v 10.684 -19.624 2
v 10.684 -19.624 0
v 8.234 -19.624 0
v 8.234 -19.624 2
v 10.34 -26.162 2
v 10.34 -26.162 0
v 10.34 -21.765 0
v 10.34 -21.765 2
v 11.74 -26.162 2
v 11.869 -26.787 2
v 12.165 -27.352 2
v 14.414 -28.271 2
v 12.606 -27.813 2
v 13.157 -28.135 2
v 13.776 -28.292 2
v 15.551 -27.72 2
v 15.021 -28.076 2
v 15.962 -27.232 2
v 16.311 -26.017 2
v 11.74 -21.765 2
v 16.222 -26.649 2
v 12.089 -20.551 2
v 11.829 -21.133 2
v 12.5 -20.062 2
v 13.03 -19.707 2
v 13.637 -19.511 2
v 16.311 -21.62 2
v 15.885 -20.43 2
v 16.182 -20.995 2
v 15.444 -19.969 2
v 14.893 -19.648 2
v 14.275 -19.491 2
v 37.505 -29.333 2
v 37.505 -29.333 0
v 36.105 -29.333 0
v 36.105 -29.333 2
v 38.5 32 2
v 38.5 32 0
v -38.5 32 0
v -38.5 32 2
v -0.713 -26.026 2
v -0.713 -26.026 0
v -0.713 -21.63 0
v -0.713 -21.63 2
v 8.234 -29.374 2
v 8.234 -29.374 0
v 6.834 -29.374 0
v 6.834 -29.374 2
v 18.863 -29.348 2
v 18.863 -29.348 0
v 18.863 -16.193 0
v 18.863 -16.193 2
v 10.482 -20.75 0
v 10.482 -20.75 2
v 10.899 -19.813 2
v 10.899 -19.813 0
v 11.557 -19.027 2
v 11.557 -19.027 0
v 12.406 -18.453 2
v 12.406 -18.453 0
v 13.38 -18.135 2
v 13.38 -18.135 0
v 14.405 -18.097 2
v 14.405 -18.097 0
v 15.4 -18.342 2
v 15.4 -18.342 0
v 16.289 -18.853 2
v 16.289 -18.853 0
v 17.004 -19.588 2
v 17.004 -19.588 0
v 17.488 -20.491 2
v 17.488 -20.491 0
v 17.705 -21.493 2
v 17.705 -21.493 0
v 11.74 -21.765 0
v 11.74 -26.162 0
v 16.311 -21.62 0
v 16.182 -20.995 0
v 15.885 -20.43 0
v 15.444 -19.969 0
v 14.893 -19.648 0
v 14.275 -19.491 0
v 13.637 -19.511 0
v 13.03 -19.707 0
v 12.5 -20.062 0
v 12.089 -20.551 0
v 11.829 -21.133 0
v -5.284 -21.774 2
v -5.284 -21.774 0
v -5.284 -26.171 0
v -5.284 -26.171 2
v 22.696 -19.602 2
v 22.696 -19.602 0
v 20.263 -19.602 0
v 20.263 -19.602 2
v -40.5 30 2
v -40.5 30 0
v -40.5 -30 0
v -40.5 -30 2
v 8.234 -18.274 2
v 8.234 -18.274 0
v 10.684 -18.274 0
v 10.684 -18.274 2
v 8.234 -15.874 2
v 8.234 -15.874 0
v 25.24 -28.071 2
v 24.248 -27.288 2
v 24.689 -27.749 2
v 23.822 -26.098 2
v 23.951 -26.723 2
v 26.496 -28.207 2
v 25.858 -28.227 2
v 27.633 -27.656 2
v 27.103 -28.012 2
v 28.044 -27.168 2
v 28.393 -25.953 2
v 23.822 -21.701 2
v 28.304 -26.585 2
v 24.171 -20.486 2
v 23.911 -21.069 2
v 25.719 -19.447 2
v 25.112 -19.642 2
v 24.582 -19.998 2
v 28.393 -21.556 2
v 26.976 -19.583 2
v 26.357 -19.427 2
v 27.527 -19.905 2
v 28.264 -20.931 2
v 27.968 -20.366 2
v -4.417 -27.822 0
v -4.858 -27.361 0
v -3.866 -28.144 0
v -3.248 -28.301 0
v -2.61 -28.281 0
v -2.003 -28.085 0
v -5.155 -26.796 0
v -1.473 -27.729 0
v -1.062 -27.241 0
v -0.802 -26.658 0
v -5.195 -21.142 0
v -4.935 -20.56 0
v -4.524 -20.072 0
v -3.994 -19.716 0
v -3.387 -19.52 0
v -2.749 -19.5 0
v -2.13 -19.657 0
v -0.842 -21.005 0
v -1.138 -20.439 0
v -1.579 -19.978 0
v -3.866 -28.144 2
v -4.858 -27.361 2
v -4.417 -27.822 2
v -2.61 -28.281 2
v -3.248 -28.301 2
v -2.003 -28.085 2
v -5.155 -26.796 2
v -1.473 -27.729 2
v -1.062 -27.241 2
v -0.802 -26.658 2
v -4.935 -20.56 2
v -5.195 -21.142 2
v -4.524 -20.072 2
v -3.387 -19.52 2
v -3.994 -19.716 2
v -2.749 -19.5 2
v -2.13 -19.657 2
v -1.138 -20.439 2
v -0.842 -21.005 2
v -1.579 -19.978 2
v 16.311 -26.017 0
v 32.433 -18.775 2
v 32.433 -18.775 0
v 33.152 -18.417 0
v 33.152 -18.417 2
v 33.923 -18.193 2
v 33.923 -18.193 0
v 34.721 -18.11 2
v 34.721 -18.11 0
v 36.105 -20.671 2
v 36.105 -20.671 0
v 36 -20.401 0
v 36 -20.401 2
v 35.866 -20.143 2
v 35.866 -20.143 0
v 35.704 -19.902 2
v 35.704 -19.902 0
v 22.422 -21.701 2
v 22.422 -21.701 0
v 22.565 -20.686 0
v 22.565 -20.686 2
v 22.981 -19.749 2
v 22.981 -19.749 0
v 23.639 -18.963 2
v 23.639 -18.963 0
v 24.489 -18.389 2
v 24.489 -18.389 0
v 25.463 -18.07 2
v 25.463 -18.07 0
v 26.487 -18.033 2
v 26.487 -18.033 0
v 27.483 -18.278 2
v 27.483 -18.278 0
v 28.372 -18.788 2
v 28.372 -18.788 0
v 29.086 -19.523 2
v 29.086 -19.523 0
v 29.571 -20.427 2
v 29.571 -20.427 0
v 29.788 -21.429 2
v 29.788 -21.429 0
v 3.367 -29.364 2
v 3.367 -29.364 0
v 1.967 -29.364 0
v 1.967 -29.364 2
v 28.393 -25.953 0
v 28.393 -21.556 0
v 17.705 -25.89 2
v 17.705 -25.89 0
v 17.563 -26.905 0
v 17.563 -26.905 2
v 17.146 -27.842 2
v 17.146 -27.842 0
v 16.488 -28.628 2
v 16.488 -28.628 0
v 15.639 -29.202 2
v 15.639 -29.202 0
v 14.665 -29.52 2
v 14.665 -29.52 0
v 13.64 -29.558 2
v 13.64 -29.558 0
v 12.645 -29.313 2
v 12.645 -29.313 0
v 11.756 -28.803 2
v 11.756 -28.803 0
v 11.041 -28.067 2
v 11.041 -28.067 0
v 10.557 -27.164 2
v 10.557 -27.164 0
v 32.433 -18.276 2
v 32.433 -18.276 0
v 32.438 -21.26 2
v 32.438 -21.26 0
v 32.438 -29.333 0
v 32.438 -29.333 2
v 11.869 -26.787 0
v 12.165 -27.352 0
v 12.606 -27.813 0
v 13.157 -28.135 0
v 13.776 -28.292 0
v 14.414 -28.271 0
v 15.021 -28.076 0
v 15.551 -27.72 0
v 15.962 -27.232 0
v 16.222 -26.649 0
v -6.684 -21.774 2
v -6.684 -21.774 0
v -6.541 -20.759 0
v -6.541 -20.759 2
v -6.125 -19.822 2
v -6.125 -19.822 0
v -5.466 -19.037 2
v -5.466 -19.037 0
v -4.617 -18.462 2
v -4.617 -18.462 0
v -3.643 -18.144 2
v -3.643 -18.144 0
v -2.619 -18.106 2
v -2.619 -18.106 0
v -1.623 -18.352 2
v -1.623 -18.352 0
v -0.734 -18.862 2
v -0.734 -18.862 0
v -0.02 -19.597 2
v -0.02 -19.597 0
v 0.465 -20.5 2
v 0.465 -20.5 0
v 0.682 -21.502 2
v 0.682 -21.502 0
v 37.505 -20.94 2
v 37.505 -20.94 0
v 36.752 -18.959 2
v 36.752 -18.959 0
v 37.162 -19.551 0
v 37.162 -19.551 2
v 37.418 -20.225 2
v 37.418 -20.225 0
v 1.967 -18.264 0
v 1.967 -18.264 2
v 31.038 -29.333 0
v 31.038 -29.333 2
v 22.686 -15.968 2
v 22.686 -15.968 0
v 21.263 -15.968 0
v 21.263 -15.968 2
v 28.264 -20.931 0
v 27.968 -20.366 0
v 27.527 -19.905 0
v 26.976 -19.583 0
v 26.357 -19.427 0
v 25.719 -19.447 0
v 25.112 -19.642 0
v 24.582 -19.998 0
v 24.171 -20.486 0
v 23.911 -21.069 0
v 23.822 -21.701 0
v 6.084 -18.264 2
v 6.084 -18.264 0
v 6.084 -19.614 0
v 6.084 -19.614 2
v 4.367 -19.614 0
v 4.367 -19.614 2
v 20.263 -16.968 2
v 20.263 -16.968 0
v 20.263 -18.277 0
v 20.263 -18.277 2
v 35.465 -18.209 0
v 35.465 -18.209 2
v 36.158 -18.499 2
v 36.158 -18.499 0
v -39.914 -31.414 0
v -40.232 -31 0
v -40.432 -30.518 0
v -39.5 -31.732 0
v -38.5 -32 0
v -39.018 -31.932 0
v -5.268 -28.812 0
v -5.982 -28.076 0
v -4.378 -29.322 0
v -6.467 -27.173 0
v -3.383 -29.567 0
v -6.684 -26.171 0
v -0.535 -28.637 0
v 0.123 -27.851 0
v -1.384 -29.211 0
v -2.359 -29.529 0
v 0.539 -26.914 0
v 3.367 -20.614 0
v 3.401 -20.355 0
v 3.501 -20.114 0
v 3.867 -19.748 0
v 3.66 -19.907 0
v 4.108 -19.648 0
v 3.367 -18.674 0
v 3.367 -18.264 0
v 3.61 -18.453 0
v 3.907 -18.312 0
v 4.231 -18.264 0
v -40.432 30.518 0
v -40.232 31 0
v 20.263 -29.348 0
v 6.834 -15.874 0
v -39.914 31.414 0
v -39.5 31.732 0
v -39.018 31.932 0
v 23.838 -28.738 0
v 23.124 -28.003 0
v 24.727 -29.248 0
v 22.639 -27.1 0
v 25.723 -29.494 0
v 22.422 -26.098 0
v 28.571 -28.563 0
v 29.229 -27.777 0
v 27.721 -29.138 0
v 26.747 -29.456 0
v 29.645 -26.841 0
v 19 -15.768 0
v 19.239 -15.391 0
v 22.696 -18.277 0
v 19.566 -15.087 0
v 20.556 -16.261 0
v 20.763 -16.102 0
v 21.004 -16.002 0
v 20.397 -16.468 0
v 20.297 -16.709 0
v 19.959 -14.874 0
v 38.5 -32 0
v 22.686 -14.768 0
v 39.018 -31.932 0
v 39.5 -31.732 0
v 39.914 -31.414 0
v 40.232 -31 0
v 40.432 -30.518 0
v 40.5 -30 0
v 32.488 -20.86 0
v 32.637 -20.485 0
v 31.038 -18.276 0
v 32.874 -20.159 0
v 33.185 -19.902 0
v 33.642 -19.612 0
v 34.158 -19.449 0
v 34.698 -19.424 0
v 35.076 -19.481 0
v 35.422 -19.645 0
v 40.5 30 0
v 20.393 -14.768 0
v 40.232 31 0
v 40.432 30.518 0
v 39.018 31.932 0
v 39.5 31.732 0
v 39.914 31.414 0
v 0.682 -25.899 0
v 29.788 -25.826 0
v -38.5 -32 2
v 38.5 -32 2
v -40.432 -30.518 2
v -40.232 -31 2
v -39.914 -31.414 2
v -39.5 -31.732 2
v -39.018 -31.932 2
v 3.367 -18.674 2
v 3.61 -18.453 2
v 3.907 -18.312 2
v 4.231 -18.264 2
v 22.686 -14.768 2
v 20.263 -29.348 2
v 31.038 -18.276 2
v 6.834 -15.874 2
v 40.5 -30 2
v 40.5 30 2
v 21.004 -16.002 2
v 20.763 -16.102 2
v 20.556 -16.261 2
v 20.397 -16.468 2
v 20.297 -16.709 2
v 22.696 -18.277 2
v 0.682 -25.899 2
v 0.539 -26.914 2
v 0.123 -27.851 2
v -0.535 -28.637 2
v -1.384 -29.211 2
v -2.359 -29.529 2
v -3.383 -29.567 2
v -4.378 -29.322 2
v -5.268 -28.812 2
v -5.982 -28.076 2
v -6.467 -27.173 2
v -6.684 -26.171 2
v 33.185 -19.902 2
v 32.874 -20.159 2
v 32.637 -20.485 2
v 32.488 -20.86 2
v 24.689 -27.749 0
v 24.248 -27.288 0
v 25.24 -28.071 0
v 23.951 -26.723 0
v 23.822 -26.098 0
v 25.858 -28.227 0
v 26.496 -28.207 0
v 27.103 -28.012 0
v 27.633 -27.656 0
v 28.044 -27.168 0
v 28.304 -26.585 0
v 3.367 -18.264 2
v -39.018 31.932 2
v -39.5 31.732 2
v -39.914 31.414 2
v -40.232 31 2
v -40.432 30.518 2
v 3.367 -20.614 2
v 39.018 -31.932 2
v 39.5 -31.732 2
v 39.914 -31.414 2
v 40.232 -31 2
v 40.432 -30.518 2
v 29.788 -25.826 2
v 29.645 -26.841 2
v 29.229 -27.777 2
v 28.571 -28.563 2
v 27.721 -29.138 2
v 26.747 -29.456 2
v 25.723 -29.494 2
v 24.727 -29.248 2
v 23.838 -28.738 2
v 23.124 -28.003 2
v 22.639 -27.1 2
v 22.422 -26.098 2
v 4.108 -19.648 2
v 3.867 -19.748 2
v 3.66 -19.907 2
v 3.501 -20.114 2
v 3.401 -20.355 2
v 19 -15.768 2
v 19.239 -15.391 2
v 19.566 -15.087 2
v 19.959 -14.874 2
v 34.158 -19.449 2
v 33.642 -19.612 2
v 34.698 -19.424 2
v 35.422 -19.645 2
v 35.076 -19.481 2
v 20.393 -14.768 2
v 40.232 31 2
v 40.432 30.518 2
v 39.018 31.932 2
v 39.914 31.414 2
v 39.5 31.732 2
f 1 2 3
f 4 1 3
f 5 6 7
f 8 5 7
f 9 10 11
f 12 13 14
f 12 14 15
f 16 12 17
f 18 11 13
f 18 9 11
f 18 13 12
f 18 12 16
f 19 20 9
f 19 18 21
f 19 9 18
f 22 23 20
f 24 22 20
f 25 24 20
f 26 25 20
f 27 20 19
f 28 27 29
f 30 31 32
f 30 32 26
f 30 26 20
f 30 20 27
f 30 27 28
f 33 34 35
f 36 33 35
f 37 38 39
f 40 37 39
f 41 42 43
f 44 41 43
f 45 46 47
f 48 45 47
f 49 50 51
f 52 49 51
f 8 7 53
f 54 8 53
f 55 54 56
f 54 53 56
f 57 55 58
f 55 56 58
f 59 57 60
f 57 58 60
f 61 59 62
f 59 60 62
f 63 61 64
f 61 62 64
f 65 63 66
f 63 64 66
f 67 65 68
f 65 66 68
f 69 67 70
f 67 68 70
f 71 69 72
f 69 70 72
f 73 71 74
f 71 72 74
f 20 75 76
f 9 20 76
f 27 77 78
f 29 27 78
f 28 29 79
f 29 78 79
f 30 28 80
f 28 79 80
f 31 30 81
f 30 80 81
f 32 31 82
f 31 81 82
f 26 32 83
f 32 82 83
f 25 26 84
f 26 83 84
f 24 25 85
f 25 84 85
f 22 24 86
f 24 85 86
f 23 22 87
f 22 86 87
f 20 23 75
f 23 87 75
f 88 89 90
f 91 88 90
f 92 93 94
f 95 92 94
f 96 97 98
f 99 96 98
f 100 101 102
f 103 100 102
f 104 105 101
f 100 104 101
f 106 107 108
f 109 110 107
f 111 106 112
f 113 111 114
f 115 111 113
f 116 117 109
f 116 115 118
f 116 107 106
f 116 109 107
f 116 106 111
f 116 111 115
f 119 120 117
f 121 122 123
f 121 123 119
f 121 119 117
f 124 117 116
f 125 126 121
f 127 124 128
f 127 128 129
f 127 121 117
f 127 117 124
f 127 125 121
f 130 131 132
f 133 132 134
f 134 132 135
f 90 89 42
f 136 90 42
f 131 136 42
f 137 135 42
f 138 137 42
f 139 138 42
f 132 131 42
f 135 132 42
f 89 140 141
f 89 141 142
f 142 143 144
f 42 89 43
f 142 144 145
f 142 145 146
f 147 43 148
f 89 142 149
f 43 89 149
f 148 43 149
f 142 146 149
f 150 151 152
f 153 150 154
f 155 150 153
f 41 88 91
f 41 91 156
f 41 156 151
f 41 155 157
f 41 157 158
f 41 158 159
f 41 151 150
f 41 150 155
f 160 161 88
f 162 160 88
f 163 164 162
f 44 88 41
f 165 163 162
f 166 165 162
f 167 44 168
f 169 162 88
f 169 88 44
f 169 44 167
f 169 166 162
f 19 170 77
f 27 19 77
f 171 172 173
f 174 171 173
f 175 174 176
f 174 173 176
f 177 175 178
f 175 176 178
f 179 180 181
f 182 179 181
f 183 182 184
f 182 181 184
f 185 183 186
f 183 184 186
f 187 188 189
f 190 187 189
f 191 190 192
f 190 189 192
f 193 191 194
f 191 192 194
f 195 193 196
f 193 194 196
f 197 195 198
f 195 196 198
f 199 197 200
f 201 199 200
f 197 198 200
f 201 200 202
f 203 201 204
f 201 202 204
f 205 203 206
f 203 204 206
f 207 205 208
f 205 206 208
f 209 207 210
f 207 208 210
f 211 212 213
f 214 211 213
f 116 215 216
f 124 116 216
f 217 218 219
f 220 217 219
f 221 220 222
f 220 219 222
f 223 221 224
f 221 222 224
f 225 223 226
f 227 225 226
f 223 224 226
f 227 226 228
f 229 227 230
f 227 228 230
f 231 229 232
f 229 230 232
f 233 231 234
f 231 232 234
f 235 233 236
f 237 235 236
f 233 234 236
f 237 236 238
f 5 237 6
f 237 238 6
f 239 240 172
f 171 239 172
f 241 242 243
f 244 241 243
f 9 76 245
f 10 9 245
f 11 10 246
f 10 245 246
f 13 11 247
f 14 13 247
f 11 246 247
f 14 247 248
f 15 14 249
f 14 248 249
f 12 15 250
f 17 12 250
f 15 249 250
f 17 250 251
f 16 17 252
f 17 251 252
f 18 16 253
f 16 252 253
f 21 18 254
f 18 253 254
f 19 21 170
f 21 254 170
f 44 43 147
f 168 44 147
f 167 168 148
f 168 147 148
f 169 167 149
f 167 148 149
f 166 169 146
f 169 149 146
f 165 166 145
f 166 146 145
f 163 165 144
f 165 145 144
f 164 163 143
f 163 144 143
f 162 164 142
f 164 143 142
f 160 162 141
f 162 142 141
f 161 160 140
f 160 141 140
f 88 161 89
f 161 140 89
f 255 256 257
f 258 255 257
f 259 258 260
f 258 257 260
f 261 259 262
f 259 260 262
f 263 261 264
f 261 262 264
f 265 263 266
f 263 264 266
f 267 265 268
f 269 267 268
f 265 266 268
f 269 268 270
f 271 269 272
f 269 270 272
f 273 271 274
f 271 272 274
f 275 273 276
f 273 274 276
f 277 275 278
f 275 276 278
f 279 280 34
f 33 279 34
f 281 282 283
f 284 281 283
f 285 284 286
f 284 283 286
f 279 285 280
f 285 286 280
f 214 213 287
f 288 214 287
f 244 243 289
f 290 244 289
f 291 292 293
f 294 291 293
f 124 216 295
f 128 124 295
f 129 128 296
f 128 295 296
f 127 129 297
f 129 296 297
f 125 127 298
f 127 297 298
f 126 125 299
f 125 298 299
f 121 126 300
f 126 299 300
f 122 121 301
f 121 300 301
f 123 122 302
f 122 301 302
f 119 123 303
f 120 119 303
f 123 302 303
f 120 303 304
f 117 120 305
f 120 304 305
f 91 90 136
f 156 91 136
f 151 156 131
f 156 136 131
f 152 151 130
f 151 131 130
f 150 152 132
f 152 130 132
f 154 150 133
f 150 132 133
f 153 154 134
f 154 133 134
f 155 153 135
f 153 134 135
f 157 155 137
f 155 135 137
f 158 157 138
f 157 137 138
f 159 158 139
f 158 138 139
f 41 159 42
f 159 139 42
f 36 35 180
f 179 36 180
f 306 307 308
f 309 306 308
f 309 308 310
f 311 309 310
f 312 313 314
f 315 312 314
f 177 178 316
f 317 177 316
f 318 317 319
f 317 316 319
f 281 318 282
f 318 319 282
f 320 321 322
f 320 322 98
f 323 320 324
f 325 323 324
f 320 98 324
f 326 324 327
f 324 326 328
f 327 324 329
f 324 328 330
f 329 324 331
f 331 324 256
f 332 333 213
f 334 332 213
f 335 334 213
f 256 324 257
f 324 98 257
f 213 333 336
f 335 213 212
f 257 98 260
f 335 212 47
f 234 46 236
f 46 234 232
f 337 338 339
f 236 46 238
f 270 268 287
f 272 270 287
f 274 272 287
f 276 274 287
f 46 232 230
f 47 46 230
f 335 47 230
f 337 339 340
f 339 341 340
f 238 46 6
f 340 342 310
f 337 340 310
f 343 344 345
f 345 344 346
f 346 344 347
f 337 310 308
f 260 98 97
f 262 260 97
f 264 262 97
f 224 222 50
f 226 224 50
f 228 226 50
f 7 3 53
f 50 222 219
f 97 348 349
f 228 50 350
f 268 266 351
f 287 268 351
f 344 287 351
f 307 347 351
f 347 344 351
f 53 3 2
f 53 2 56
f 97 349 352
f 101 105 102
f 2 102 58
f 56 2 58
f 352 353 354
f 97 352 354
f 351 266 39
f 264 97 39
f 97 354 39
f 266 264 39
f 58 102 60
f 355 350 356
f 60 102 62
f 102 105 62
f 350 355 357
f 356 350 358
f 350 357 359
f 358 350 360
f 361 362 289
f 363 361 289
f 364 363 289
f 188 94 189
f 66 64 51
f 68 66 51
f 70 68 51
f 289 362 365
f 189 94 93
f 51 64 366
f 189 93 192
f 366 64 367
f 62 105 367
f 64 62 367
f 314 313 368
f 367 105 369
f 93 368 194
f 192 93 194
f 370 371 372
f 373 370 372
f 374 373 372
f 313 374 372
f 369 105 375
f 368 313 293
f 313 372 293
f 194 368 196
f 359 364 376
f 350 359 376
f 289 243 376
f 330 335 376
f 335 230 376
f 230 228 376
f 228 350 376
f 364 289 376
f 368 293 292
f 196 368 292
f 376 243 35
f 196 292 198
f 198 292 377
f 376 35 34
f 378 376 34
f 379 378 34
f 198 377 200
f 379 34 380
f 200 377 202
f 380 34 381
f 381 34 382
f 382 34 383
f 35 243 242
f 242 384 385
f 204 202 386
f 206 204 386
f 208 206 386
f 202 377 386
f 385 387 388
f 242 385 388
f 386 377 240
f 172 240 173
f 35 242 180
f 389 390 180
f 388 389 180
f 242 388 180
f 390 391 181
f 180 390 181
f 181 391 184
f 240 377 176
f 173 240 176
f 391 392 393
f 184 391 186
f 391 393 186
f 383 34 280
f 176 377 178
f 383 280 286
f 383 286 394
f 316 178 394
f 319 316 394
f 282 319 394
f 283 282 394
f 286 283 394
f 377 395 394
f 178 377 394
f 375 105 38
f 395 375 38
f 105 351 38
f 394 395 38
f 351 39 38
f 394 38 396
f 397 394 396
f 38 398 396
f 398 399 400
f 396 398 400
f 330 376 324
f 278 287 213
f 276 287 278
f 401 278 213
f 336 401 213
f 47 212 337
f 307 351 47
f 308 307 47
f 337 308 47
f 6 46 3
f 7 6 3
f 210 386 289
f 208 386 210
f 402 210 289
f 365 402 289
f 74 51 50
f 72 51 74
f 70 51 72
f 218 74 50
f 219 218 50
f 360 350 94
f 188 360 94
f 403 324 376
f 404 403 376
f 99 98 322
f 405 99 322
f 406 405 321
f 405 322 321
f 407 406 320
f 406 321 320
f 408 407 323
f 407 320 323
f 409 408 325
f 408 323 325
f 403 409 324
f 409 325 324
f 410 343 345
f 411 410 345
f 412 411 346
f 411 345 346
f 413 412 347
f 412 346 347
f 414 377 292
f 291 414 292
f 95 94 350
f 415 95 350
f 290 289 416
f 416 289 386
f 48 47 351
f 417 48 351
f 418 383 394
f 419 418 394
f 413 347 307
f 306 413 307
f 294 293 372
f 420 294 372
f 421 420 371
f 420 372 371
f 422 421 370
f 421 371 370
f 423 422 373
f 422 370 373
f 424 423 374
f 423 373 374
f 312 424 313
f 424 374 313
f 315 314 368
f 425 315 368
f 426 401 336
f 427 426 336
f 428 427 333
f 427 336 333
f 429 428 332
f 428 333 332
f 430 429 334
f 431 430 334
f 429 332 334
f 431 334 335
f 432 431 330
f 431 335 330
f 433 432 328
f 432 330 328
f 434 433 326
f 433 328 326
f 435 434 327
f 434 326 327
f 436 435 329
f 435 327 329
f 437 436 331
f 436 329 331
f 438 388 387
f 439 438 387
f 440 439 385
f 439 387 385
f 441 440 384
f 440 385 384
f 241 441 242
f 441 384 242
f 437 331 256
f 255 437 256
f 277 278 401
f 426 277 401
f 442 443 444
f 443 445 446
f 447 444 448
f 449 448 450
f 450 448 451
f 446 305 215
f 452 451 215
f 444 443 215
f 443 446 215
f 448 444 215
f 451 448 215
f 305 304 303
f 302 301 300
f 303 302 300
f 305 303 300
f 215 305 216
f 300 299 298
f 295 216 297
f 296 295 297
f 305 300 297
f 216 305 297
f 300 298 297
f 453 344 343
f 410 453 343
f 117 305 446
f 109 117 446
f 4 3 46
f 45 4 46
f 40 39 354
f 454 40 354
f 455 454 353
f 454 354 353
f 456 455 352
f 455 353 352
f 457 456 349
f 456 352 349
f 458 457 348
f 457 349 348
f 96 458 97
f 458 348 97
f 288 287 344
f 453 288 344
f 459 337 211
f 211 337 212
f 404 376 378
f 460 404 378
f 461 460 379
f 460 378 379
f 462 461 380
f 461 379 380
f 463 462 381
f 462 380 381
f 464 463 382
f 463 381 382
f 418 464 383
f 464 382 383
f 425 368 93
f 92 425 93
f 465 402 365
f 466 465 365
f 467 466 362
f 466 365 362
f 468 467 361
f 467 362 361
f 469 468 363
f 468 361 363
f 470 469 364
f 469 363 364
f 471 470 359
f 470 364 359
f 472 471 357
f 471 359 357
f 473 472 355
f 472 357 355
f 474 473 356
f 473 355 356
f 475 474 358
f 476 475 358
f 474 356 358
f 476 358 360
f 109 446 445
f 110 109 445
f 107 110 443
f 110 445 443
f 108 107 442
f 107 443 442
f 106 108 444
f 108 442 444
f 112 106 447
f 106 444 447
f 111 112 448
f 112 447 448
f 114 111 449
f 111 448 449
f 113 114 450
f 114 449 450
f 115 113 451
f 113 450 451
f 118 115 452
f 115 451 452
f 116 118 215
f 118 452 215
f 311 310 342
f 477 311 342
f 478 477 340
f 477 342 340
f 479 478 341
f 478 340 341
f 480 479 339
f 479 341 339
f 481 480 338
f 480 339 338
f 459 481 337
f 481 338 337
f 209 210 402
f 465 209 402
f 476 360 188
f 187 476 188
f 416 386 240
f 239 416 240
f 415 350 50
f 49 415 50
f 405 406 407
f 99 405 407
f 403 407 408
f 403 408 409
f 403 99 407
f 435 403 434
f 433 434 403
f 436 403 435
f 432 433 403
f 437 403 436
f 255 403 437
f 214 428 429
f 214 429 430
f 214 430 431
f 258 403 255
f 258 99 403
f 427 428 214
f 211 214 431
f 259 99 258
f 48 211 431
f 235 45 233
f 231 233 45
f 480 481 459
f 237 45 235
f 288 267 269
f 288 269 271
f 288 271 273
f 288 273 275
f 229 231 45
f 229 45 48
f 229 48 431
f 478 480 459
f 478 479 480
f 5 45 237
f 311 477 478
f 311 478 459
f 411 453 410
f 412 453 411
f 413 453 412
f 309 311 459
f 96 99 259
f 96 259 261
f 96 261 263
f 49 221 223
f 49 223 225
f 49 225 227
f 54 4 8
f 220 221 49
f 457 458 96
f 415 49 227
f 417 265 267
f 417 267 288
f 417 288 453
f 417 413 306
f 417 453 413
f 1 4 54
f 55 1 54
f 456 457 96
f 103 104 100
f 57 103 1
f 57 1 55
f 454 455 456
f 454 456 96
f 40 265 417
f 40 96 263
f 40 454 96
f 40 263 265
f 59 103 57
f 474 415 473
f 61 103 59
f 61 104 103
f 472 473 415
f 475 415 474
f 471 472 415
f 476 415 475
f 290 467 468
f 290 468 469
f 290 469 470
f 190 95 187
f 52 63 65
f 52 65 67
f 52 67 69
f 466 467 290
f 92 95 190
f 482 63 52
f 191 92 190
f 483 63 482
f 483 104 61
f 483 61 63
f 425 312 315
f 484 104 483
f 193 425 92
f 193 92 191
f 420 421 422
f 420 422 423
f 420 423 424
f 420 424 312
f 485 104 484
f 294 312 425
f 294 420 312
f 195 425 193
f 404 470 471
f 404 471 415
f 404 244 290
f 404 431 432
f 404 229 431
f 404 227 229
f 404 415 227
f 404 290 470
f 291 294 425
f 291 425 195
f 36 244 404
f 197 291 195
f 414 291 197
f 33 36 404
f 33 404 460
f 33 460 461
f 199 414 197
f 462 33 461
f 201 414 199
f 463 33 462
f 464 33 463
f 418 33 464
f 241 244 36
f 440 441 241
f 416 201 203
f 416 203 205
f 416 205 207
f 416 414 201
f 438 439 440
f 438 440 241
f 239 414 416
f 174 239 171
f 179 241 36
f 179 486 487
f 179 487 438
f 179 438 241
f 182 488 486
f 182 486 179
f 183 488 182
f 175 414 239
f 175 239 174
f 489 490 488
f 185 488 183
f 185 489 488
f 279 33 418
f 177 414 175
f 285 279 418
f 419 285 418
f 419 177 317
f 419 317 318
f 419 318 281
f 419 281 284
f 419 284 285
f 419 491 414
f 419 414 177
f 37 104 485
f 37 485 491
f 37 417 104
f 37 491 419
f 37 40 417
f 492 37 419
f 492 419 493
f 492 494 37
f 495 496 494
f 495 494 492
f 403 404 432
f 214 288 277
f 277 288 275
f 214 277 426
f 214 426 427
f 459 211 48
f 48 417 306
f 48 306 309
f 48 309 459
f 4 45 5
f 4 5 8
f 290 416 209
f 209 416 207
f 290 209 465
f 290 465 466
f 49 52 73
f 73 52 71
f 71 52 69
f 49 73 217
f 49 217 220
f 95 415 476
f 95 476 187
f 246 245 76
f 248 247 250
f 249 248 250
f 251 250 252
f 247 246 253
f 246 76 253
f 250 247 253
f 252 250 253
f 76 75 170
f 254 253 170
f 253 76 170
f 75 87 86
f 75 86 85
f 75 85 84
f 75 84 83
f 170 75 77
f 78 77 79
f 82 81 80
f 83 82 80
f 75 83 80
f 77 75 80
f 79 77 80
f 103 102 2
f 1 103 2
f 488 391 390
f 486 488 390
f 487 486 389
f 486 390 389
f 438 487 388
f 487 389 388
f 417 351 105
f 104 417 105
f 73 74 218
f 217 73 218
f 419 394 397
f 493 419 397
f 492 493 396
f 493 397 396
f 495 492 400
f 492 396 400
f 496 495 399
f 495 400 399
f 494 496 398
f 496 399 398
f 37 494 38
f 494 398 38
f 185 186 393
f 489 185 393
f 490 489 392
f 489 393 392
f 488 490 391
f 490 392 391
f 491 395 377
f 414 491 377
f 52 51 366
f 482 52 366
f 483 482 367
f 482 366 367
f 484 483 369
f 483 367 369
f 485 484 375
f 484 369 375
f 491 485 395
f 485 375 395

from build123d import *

# Parameters (mm, degrees)
F1_DEPTH = 2


with BuildPart() as f1:
    # F0 (on Top) → F1 (new body)
    with BuildSketch(Plane.XY):
        with BuildLine():
            Line((38.5, 32), (-38.5, 32))
            ThreePointArc((-38.5, 32), (-39.914214, 31.414214), (-40.5, 30))
            Line((-40.5, 30), (-40.5, -30))
            ThreePointArc((-40.5, -30), (-39.914214, -31.414214), (-38.5, -32))
            Line((-38.5, -32), (38.5, -32))
            ThreePointArc((38.5, -32), (39.914214, -31.414214), (40.5, -30))
            Line((40.5, -30), (40.5, 30))
            ThreePointArc((40.5, 30), (39.914214, 31.414214), (38.5, 32))
        make_face()
        with BuildLine():
            Line((-6.683545, -26.171246), (-6.683545, -21.774288))
            ThreePointArc((-6.683545, -21.774288), (-3.132122, -18.089166), (0.68167, -21.502041))
            Line((0.68167, -21.502041), (0.68167, -25.898998))
            ThreePointArc((0.68167, -25.898998), (-2.869752, -29.58412), (-6.683545, -26.171246))
        make_face(mode=Mode.SUBTRACT)
        with BuildLine():
            Line((1.966994, -29.363632), (1.966994, -18.263632))
            Line((1.966994, -18.263632), (3.366994, -18.263632))
            Line((3.366994, -18.263632), (3.366994, -18.673532))
            ThreePointArc((3.366994, -18.673532), (3.753039, -18.371299), (4.231353, -18.263632))
            Line((4.231353, -18.263632), (6.084289, -18.263632))
            Line((6.084289, -18.263632), (6.084289, -19.613632))
            Line((6.084289, -19.613632), (4.366994, -19.613632))
            ThreePointArc((4.366994, -19.613632), (3.659887, -19.906525), (3.366994, -20.613632))
            Line((3.366994, -20.613632), (3.366994, -29.363632))
            Line((3.366994, -29.363632), (1.966994, -29.363632))
        make_face(mode=Mode.SUBTRACT)
        Polygon((6.834289, -29.373545), (6.834289, -15.873545), (8.234289, -15.873545), (8.234289, -18.273545), (10.684289, -18.273545), (10.684289, -19.623545), (8.234289, -19.623545), (8.234289, -29.373545), align=None, mode=Mode.SUBTRACT)
        with BuildLine():
            Line((10.3399, -26.162138), (10.3399, -21.765181))
            ThreePointArc((10.3399, -21.765181), (13.891322, -18.080059), (17.705115, -21.492933))
            Line((17.705115, -21.492933), (17.705115, -25.88989))
            ThreePointArc((17.705115, -25.88989), (14.153692, -29.575013), (10.3399, -26.162138))
        make_face(mode=Mode.SUBTRACT)
        with BuildLine():
            Line((18.863173, -29.348086), (18.863173, -16.193276))
            ThreePointArc((18.863173, -16.193276), (19.392742, -15.228356), (20.392532, -14.767994))
            Line((20.392532, -14.767994), (22.685896, -14.767994))
            Line((22.685896, -14.767994), (22.685896, -15.967994))
            Line((22.685896, -15.967994), (21.263173, -15.967994))
            ThreePointArc((21.263173, -15.967994), (20.556066, -16.260887), (20.263173, -16.967994))
            Line((20.263173, -16.967994), (20.263173, -18.277436))
            Line((20.263173, -18.277436), (22.696212, -18.277436))
            Line((22.696212, -18.277436), (22.696212, -19.601548))
            Line((22.696212, -19.601548), (20.263173, -19.601548))
            Line((20.263173, -19.601548), (20.263173, -29.348086))
            Line((20.263173, -29.348086), (18.863173, -29.348086))
        make_face(mode=Mode.SUBTRACT)
        with BuildLine():
            Line((22.422408, -26.097821), (22.422408, -21.700864))
            ThreePointArc((22.422408, -21.700864), (25.97383, -18.015741), (29.787623, -21.428616))
            Line((29.787623, -21.428616), (29.787623, -25.825573))
            ThreePointArc((29.787623, -25.825573), (26.2362, -29.510696), (22.422408, -26.097821))
        make_face(mode=Mode.SUBTRACT)
        with BuildLine():
            Line((31.037623, -29.332731), (31.037623, -18.275848))
            Line((31.037623, -18.275848), (32.433234, -18.275848))
            Line((32.433234, -18.275848), (32.433234, -18.774554))
            ThreePointArc((32.433234, -18.774554), (33.532364, -18.287756), (34.721233, -18.109856))
            ThreePointArc((34.721233, -18.109856), (35.821388, -18.331398), (36.751661, -18.959101))
            ThreePointArc((36.751661, -18.959101), (37.31007, -19.88036), (37.504673, -20.93992))
            Line((37.504673, -20.93992), (37.504673, -29.332731))
            Line((37.504673, -29.332731), (36.104673, -29.332731))
            Line((36.104673, -29.332731), (36.104673, -20.671327))
            ThreePointArc((36.104673, -20.671327), (35.936296, -20.270245), (35.704192, -19.902352))
            ThreePointArc((35.704192, -19.902352), (35.255128, -19.549945), (34.698393, -19.423865))
            ThreePointArc((34.698393, -19.423865), (33.894493, -19.5141), (33.184804, -19.902352))
            ThreePointArc((33.184804, -19.902352), (32.63676, -20.484993), (32.437623, -21.259697))
            Line((32.437623, -21.259697), (32.437623, -29.332731))
            Line((32.437623, -29.332731), (31.037623, -29.332731))
        make_face(mode=Mode.SUBTRACT)
        with BuildLine():
            ThreePointArc((-0.712852, -21.62951), (-3.068331, -19.487796), (-5.283545, -21.774288))
            Line((-5.283545, -21.774288), (-5.283545, -26.171246))
            ThreePointArc((-5.283545, -26.171246), (-2.928066, -28.31296), (-0.712852, -26.026468))
            Line((-0.712852, -26.026468), (-0.712852, -21.62951))
        make_face()
        with BuildLine():
            ThreePointArc((16.310592, -21.620403), (13.955114, -19.478689), (11.7399, -21.765181))
            Line((11.7399, -21.765181), (11.7399, -26.162138))
            ThreePointArc((11.7399, -26.162138), (14.095378, -28.303853), (16.310592, -26.01736))
            Line((16.310592, -26.01736), (16.310592, -21.620403))
        make_face()
        with BuildLine():
            ThreePointArc((28.3931, -21.556086), (26.037622, -19.414371), (23.822408, -21.700864))
            Line((23.822408, -21.700864), (23.822408, -26.097821))
            ThreePointArc((23.822408, -26.097821), (26.177886, -28.239536), (28.3931, -25.953043))
            Line((28.3931, -25.953043), (28.3931, -21.556086))
        make_face()
    extrude(amount=F1_DEPTH)


solid = f1.part
